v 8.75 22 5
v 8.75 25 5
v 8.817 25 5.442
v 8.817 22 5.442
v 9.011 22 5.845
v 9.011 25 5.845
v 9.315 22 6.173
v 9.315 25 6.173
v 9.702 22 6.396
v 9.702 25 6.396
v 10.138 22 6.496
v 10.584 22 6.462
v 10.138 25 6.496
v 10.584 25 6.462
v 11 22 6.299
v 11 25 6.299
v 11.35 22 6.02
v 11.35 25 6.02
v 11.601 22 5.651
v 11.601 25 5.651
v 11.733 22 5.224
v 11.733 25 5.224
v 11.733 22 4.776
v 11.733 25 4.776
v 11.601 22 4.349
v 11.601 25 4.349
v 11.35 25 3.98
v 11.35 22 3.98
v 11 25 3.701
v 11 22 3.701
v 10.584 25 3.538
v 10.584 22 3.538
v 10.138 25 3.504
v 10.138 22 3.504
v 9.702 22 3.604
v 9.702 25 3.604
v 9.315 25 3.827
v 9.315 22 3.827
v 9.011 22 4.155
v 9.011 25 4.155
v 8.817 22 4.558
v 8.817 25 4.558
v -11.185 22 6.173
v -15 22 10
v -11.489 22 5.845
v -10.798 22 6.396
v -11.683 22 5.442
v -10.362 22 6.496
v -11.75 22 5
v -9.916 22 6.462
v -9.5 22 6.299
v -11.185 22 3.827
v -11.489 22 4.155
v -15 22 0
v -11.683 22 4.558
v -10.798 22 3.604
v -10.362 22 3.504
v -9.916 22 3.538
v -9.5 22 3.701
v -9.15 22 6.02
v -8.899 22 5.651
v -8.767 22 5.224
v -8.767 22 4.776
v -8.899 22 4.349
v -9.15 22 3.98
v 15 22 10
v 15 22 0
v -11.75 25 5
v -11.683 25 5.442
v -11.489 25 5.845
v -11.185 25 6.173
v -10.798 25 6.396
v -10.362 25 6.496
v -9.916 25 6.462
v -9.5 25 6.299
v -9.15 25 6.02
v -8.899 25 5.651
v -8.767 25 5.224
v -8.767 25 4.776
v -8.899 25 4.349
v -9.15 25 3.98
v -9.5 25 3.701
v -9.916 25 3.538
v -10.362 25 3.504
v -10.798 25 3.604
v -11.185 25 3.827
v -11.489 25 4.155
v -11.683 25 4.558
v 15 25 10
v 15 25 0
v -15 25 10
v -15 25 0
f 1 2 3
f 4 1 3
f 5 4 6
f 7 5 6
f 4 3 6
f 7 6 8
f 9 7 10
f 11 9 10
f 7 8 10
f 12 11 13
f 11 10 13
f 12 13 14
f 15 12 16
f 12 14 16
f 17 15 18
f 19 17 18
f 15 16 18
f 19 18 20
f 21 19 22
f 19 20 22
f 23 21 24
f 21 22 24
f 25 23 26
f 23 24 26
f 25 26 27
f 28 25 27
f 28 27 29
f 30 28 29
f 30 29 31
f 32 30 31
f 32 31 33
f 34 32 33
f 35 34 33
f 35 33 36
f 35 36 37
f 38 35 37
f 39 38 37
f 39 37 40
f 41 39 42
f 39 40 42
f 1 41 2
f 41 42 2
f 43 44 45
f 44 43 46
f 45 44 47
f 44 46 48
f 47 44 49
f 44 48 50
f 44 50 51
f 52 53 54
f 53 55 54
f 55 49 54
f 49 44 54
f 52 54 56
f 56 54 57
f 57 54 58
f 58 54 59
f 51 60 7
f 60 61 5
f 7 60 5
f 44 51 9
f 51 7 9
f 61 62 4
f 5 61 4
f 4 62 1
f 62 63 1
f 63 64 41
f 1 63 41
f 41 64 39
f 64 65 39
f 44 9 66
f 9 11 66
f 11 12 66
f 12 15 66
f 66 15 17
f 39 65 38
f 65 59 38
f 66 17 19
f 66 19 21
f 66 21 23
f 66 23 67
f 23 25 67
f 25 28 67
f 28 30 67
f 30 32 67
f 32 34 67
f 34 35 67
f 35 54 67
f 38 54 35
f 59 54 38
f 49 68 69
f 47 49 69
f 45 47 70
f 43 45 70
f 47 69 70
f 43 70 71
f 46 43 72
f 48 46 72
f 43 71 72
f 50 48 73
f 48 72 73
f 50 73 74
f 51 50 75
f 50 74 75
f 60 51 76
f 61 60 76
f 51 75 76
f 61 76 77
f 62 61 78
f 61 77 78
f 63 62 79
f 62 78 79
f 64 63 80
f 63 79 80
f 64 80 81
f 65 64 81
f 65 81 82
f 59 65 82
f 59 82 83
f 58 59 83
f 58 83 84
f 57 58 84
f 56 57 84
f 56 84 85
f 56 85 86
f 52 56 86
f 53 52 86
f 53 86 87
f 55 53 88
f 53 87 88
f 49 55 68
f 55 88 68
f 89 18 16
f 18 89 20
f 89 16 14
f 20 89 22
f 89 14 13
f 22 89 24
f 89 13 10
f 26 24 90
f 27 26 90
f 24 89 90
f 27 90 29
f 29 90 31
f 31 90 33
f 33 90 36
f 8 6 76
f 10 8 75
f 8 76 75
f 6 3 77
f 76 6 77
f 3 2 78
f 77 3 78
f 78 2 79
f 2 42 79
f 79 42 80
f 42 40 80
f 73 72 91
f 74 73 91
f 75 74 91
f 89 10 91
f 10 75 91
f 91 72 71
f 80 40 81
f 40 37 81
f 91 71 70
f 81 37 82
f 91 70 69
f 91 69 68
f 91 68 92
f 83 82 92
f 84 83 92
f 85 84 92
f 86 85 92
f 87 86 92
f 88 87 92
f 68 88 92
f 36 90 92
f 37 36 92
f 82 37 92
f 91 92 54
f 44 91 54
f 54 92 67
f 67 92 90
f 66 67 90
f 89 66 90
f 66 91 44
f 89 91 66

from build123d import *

# Parameters (mm, degrees)
F0_W     = 9
F0_H     = 1.5
F1_DEPTH = 10
F3_R     = 1.5
F4_DEPTH = 3
F5_DEPTH = 3.001


with BuildPart() as f1:
    # F0 (on Top) → F1 (new body)
    with BuildSketch(Plane.XY):
        Polygon((4.5, 23.5), (4.5, 22), (15, 22), (15, 25), (-15, 25), (-15, 22), (-4.5, 22), (-4.5, 23.5), align=None)
        with Locations((0, 22.75)):
            Rectangle(F0_W, F0_H)
    extrude(amount=F1_DEPTH)

    # F3 (on offset) → F4 (cut, through all)
    with BuildSketch(Plane(origin=(0, 25, 0), x_dir=(-1, 0, 0), z_dir=(0, 1, 0))):
        with Locations((10.25, 5)):
            Circle(F3_R)
        with Locations((-10.25, 5)):
            Circle(F3_R)
    extrude(amount=-F4_DEPTH, mode=Mode.SUBTRACT)

    # F3 (on offset) → F5 (cut, through all)
    with BuildSketch(Plane(origin=(0, 25, 0), x_dir=(-1, 0, 0), z_dir=(0, 1, 0))):
        with Locations((-22.25, 5)):
            Circle(F3_R)
    extrude(amount=-F5_DEPTH, mode=Mode.SUBTRACT)


solid = f1.part
